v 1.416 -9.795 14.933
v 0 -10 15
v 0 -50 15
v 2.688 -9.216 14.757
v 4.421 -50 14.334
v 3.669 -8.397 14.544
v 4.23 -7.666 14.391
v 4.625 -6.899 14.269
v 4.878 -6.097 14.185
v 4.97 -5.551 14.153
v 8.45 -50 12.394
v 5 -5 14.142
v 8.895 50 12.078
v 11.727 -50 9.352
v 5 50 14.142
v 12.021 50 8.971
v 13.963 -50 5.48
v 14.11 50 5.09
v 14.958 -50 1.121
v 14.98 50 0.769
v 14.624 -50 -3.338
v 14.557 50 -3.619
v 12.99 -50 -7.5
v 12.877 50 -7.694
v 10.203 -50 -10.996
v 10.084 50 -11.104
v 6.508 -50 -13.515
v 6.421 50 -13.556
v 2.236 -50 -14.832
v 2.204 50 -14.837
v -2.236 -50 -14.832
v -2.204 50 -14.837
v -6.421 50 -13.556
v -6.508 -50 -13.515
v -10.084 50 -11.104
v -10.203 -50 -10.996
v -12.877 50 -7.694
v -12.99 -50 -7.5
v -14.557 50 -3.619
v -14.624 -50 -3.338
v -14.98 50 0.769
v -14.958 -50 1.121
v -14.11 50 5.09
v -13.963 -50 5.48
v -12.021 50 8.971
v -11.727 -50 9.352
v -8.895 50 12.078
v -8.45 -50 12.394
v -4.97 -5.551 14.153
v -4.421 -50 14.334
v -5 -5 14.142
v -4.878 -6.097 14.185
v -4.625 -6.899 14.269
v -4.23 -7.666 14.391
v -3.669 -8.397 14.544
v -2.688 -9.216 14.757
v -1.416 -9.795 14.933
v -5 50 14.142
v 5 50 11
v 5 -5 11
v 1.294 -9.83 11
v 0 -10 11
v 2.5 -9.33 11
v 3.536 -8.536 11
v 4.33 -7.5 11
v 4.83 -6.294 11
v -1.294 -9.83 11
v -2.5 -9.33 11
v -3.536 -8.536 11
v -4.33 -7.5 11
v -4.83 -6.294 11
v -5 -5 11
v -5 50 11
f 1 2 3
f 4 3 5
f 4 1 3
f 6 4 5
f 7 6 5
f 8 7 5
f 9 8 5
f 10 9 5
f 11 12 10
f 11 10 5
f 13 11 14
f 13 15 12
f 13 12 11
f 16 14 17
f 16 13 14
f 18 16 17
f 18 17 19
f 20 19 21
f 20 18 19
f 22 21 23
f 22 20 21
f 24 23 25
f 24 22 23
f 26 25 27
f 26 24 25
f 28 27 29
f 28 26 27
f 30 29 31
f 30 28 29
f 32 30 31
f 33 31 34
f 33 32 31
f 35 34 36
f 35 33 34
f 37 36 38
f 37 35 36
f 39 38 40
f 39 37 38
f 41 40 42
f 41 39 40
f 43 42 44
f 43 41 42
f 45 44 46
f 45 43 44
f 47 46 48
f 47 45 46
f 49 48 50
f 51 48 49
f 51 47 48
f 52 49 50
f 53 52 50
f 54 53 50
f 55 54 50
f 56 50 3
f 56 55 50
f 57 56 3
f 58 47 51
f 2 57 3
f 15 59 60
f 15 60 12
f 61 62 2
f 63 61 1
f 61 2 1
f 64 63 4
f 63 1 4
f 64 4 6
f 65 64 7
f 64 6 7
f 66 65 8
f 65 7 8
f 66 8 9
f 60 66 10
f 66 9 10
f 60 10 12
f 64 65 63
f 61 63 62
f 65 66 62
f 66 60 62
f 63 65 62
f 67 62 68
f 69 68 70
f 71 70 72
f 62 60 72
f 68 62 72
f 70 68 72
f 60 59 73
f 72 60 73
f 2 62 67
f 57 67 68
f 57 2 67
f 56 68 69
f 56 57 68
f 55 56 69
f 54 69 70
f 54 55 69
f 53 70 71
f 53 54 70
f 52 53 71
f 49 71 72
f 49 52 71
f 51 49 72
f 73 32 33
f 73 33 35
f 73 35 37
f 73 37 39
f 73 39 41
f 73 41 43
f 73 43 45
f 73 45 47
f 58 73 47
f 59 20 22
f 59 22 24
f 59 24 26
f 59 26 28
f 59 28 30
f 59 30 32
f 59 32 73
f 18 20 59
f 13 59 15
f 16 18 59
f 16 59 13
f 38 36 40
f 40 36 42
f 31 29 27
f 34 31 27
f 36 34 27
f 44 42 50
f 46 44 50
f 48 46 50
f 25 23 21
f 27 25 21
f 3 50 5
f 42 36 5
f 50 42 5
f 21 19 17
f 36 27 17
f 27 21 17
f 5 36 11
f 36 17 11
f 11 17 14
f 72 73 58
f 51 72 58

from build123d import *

# Parameters (mm, degrees)
SKETCH2_R           = 15
BOSS_EXTRUDE1_DEPTH = 50
SKETCH3_W           = 10
SKETCH3_H           = 8
CUT_EXTRUDE1_DEPTH  = 60
FILLET1_R           = 5


with BuildPart() as part:
    # Sketch2 → Boss-Extrude1 (new, symmetric)
    with BuildSketch(Plane(origin=(0, 0, 0), x_dir=(-1, 0, 0), z_dir=(0, 1, 0))):
        with Locations(Location((0, 0, 0), (0, 0, 90))):
            Circle(SKETCH2_R)
    extrude(amount=BOSS_EXTRUDE1_DEPTH, both=True)

    # Sketch3 → Cut-Extrude1 (cut)
    with BuildSketch(Plane(origin=(0, 50, 0), x_dir=(-1, 0, 0), z_dir=(0, 1, 0))):
        with Locations((0, 15)):
            Rectangle(SKETCH3_W, SKETCH3_H)
    extrude(amount=-CUT_EXTRUDE1_DEPTH, mode=Mode.SUBTRACT)

    # Fillet1
    fillet1_edges = [part.edges().sort_by_distance(p)[0] for p in [
        (5, -10, 12.571067812),
        (-5, -10, 12.571067812),
    ]]
    fillet(fillet1_edges, radius=FILLET1_R - 0.0001)  # a hair under: the kernel refuses the full size


solid = part.part
